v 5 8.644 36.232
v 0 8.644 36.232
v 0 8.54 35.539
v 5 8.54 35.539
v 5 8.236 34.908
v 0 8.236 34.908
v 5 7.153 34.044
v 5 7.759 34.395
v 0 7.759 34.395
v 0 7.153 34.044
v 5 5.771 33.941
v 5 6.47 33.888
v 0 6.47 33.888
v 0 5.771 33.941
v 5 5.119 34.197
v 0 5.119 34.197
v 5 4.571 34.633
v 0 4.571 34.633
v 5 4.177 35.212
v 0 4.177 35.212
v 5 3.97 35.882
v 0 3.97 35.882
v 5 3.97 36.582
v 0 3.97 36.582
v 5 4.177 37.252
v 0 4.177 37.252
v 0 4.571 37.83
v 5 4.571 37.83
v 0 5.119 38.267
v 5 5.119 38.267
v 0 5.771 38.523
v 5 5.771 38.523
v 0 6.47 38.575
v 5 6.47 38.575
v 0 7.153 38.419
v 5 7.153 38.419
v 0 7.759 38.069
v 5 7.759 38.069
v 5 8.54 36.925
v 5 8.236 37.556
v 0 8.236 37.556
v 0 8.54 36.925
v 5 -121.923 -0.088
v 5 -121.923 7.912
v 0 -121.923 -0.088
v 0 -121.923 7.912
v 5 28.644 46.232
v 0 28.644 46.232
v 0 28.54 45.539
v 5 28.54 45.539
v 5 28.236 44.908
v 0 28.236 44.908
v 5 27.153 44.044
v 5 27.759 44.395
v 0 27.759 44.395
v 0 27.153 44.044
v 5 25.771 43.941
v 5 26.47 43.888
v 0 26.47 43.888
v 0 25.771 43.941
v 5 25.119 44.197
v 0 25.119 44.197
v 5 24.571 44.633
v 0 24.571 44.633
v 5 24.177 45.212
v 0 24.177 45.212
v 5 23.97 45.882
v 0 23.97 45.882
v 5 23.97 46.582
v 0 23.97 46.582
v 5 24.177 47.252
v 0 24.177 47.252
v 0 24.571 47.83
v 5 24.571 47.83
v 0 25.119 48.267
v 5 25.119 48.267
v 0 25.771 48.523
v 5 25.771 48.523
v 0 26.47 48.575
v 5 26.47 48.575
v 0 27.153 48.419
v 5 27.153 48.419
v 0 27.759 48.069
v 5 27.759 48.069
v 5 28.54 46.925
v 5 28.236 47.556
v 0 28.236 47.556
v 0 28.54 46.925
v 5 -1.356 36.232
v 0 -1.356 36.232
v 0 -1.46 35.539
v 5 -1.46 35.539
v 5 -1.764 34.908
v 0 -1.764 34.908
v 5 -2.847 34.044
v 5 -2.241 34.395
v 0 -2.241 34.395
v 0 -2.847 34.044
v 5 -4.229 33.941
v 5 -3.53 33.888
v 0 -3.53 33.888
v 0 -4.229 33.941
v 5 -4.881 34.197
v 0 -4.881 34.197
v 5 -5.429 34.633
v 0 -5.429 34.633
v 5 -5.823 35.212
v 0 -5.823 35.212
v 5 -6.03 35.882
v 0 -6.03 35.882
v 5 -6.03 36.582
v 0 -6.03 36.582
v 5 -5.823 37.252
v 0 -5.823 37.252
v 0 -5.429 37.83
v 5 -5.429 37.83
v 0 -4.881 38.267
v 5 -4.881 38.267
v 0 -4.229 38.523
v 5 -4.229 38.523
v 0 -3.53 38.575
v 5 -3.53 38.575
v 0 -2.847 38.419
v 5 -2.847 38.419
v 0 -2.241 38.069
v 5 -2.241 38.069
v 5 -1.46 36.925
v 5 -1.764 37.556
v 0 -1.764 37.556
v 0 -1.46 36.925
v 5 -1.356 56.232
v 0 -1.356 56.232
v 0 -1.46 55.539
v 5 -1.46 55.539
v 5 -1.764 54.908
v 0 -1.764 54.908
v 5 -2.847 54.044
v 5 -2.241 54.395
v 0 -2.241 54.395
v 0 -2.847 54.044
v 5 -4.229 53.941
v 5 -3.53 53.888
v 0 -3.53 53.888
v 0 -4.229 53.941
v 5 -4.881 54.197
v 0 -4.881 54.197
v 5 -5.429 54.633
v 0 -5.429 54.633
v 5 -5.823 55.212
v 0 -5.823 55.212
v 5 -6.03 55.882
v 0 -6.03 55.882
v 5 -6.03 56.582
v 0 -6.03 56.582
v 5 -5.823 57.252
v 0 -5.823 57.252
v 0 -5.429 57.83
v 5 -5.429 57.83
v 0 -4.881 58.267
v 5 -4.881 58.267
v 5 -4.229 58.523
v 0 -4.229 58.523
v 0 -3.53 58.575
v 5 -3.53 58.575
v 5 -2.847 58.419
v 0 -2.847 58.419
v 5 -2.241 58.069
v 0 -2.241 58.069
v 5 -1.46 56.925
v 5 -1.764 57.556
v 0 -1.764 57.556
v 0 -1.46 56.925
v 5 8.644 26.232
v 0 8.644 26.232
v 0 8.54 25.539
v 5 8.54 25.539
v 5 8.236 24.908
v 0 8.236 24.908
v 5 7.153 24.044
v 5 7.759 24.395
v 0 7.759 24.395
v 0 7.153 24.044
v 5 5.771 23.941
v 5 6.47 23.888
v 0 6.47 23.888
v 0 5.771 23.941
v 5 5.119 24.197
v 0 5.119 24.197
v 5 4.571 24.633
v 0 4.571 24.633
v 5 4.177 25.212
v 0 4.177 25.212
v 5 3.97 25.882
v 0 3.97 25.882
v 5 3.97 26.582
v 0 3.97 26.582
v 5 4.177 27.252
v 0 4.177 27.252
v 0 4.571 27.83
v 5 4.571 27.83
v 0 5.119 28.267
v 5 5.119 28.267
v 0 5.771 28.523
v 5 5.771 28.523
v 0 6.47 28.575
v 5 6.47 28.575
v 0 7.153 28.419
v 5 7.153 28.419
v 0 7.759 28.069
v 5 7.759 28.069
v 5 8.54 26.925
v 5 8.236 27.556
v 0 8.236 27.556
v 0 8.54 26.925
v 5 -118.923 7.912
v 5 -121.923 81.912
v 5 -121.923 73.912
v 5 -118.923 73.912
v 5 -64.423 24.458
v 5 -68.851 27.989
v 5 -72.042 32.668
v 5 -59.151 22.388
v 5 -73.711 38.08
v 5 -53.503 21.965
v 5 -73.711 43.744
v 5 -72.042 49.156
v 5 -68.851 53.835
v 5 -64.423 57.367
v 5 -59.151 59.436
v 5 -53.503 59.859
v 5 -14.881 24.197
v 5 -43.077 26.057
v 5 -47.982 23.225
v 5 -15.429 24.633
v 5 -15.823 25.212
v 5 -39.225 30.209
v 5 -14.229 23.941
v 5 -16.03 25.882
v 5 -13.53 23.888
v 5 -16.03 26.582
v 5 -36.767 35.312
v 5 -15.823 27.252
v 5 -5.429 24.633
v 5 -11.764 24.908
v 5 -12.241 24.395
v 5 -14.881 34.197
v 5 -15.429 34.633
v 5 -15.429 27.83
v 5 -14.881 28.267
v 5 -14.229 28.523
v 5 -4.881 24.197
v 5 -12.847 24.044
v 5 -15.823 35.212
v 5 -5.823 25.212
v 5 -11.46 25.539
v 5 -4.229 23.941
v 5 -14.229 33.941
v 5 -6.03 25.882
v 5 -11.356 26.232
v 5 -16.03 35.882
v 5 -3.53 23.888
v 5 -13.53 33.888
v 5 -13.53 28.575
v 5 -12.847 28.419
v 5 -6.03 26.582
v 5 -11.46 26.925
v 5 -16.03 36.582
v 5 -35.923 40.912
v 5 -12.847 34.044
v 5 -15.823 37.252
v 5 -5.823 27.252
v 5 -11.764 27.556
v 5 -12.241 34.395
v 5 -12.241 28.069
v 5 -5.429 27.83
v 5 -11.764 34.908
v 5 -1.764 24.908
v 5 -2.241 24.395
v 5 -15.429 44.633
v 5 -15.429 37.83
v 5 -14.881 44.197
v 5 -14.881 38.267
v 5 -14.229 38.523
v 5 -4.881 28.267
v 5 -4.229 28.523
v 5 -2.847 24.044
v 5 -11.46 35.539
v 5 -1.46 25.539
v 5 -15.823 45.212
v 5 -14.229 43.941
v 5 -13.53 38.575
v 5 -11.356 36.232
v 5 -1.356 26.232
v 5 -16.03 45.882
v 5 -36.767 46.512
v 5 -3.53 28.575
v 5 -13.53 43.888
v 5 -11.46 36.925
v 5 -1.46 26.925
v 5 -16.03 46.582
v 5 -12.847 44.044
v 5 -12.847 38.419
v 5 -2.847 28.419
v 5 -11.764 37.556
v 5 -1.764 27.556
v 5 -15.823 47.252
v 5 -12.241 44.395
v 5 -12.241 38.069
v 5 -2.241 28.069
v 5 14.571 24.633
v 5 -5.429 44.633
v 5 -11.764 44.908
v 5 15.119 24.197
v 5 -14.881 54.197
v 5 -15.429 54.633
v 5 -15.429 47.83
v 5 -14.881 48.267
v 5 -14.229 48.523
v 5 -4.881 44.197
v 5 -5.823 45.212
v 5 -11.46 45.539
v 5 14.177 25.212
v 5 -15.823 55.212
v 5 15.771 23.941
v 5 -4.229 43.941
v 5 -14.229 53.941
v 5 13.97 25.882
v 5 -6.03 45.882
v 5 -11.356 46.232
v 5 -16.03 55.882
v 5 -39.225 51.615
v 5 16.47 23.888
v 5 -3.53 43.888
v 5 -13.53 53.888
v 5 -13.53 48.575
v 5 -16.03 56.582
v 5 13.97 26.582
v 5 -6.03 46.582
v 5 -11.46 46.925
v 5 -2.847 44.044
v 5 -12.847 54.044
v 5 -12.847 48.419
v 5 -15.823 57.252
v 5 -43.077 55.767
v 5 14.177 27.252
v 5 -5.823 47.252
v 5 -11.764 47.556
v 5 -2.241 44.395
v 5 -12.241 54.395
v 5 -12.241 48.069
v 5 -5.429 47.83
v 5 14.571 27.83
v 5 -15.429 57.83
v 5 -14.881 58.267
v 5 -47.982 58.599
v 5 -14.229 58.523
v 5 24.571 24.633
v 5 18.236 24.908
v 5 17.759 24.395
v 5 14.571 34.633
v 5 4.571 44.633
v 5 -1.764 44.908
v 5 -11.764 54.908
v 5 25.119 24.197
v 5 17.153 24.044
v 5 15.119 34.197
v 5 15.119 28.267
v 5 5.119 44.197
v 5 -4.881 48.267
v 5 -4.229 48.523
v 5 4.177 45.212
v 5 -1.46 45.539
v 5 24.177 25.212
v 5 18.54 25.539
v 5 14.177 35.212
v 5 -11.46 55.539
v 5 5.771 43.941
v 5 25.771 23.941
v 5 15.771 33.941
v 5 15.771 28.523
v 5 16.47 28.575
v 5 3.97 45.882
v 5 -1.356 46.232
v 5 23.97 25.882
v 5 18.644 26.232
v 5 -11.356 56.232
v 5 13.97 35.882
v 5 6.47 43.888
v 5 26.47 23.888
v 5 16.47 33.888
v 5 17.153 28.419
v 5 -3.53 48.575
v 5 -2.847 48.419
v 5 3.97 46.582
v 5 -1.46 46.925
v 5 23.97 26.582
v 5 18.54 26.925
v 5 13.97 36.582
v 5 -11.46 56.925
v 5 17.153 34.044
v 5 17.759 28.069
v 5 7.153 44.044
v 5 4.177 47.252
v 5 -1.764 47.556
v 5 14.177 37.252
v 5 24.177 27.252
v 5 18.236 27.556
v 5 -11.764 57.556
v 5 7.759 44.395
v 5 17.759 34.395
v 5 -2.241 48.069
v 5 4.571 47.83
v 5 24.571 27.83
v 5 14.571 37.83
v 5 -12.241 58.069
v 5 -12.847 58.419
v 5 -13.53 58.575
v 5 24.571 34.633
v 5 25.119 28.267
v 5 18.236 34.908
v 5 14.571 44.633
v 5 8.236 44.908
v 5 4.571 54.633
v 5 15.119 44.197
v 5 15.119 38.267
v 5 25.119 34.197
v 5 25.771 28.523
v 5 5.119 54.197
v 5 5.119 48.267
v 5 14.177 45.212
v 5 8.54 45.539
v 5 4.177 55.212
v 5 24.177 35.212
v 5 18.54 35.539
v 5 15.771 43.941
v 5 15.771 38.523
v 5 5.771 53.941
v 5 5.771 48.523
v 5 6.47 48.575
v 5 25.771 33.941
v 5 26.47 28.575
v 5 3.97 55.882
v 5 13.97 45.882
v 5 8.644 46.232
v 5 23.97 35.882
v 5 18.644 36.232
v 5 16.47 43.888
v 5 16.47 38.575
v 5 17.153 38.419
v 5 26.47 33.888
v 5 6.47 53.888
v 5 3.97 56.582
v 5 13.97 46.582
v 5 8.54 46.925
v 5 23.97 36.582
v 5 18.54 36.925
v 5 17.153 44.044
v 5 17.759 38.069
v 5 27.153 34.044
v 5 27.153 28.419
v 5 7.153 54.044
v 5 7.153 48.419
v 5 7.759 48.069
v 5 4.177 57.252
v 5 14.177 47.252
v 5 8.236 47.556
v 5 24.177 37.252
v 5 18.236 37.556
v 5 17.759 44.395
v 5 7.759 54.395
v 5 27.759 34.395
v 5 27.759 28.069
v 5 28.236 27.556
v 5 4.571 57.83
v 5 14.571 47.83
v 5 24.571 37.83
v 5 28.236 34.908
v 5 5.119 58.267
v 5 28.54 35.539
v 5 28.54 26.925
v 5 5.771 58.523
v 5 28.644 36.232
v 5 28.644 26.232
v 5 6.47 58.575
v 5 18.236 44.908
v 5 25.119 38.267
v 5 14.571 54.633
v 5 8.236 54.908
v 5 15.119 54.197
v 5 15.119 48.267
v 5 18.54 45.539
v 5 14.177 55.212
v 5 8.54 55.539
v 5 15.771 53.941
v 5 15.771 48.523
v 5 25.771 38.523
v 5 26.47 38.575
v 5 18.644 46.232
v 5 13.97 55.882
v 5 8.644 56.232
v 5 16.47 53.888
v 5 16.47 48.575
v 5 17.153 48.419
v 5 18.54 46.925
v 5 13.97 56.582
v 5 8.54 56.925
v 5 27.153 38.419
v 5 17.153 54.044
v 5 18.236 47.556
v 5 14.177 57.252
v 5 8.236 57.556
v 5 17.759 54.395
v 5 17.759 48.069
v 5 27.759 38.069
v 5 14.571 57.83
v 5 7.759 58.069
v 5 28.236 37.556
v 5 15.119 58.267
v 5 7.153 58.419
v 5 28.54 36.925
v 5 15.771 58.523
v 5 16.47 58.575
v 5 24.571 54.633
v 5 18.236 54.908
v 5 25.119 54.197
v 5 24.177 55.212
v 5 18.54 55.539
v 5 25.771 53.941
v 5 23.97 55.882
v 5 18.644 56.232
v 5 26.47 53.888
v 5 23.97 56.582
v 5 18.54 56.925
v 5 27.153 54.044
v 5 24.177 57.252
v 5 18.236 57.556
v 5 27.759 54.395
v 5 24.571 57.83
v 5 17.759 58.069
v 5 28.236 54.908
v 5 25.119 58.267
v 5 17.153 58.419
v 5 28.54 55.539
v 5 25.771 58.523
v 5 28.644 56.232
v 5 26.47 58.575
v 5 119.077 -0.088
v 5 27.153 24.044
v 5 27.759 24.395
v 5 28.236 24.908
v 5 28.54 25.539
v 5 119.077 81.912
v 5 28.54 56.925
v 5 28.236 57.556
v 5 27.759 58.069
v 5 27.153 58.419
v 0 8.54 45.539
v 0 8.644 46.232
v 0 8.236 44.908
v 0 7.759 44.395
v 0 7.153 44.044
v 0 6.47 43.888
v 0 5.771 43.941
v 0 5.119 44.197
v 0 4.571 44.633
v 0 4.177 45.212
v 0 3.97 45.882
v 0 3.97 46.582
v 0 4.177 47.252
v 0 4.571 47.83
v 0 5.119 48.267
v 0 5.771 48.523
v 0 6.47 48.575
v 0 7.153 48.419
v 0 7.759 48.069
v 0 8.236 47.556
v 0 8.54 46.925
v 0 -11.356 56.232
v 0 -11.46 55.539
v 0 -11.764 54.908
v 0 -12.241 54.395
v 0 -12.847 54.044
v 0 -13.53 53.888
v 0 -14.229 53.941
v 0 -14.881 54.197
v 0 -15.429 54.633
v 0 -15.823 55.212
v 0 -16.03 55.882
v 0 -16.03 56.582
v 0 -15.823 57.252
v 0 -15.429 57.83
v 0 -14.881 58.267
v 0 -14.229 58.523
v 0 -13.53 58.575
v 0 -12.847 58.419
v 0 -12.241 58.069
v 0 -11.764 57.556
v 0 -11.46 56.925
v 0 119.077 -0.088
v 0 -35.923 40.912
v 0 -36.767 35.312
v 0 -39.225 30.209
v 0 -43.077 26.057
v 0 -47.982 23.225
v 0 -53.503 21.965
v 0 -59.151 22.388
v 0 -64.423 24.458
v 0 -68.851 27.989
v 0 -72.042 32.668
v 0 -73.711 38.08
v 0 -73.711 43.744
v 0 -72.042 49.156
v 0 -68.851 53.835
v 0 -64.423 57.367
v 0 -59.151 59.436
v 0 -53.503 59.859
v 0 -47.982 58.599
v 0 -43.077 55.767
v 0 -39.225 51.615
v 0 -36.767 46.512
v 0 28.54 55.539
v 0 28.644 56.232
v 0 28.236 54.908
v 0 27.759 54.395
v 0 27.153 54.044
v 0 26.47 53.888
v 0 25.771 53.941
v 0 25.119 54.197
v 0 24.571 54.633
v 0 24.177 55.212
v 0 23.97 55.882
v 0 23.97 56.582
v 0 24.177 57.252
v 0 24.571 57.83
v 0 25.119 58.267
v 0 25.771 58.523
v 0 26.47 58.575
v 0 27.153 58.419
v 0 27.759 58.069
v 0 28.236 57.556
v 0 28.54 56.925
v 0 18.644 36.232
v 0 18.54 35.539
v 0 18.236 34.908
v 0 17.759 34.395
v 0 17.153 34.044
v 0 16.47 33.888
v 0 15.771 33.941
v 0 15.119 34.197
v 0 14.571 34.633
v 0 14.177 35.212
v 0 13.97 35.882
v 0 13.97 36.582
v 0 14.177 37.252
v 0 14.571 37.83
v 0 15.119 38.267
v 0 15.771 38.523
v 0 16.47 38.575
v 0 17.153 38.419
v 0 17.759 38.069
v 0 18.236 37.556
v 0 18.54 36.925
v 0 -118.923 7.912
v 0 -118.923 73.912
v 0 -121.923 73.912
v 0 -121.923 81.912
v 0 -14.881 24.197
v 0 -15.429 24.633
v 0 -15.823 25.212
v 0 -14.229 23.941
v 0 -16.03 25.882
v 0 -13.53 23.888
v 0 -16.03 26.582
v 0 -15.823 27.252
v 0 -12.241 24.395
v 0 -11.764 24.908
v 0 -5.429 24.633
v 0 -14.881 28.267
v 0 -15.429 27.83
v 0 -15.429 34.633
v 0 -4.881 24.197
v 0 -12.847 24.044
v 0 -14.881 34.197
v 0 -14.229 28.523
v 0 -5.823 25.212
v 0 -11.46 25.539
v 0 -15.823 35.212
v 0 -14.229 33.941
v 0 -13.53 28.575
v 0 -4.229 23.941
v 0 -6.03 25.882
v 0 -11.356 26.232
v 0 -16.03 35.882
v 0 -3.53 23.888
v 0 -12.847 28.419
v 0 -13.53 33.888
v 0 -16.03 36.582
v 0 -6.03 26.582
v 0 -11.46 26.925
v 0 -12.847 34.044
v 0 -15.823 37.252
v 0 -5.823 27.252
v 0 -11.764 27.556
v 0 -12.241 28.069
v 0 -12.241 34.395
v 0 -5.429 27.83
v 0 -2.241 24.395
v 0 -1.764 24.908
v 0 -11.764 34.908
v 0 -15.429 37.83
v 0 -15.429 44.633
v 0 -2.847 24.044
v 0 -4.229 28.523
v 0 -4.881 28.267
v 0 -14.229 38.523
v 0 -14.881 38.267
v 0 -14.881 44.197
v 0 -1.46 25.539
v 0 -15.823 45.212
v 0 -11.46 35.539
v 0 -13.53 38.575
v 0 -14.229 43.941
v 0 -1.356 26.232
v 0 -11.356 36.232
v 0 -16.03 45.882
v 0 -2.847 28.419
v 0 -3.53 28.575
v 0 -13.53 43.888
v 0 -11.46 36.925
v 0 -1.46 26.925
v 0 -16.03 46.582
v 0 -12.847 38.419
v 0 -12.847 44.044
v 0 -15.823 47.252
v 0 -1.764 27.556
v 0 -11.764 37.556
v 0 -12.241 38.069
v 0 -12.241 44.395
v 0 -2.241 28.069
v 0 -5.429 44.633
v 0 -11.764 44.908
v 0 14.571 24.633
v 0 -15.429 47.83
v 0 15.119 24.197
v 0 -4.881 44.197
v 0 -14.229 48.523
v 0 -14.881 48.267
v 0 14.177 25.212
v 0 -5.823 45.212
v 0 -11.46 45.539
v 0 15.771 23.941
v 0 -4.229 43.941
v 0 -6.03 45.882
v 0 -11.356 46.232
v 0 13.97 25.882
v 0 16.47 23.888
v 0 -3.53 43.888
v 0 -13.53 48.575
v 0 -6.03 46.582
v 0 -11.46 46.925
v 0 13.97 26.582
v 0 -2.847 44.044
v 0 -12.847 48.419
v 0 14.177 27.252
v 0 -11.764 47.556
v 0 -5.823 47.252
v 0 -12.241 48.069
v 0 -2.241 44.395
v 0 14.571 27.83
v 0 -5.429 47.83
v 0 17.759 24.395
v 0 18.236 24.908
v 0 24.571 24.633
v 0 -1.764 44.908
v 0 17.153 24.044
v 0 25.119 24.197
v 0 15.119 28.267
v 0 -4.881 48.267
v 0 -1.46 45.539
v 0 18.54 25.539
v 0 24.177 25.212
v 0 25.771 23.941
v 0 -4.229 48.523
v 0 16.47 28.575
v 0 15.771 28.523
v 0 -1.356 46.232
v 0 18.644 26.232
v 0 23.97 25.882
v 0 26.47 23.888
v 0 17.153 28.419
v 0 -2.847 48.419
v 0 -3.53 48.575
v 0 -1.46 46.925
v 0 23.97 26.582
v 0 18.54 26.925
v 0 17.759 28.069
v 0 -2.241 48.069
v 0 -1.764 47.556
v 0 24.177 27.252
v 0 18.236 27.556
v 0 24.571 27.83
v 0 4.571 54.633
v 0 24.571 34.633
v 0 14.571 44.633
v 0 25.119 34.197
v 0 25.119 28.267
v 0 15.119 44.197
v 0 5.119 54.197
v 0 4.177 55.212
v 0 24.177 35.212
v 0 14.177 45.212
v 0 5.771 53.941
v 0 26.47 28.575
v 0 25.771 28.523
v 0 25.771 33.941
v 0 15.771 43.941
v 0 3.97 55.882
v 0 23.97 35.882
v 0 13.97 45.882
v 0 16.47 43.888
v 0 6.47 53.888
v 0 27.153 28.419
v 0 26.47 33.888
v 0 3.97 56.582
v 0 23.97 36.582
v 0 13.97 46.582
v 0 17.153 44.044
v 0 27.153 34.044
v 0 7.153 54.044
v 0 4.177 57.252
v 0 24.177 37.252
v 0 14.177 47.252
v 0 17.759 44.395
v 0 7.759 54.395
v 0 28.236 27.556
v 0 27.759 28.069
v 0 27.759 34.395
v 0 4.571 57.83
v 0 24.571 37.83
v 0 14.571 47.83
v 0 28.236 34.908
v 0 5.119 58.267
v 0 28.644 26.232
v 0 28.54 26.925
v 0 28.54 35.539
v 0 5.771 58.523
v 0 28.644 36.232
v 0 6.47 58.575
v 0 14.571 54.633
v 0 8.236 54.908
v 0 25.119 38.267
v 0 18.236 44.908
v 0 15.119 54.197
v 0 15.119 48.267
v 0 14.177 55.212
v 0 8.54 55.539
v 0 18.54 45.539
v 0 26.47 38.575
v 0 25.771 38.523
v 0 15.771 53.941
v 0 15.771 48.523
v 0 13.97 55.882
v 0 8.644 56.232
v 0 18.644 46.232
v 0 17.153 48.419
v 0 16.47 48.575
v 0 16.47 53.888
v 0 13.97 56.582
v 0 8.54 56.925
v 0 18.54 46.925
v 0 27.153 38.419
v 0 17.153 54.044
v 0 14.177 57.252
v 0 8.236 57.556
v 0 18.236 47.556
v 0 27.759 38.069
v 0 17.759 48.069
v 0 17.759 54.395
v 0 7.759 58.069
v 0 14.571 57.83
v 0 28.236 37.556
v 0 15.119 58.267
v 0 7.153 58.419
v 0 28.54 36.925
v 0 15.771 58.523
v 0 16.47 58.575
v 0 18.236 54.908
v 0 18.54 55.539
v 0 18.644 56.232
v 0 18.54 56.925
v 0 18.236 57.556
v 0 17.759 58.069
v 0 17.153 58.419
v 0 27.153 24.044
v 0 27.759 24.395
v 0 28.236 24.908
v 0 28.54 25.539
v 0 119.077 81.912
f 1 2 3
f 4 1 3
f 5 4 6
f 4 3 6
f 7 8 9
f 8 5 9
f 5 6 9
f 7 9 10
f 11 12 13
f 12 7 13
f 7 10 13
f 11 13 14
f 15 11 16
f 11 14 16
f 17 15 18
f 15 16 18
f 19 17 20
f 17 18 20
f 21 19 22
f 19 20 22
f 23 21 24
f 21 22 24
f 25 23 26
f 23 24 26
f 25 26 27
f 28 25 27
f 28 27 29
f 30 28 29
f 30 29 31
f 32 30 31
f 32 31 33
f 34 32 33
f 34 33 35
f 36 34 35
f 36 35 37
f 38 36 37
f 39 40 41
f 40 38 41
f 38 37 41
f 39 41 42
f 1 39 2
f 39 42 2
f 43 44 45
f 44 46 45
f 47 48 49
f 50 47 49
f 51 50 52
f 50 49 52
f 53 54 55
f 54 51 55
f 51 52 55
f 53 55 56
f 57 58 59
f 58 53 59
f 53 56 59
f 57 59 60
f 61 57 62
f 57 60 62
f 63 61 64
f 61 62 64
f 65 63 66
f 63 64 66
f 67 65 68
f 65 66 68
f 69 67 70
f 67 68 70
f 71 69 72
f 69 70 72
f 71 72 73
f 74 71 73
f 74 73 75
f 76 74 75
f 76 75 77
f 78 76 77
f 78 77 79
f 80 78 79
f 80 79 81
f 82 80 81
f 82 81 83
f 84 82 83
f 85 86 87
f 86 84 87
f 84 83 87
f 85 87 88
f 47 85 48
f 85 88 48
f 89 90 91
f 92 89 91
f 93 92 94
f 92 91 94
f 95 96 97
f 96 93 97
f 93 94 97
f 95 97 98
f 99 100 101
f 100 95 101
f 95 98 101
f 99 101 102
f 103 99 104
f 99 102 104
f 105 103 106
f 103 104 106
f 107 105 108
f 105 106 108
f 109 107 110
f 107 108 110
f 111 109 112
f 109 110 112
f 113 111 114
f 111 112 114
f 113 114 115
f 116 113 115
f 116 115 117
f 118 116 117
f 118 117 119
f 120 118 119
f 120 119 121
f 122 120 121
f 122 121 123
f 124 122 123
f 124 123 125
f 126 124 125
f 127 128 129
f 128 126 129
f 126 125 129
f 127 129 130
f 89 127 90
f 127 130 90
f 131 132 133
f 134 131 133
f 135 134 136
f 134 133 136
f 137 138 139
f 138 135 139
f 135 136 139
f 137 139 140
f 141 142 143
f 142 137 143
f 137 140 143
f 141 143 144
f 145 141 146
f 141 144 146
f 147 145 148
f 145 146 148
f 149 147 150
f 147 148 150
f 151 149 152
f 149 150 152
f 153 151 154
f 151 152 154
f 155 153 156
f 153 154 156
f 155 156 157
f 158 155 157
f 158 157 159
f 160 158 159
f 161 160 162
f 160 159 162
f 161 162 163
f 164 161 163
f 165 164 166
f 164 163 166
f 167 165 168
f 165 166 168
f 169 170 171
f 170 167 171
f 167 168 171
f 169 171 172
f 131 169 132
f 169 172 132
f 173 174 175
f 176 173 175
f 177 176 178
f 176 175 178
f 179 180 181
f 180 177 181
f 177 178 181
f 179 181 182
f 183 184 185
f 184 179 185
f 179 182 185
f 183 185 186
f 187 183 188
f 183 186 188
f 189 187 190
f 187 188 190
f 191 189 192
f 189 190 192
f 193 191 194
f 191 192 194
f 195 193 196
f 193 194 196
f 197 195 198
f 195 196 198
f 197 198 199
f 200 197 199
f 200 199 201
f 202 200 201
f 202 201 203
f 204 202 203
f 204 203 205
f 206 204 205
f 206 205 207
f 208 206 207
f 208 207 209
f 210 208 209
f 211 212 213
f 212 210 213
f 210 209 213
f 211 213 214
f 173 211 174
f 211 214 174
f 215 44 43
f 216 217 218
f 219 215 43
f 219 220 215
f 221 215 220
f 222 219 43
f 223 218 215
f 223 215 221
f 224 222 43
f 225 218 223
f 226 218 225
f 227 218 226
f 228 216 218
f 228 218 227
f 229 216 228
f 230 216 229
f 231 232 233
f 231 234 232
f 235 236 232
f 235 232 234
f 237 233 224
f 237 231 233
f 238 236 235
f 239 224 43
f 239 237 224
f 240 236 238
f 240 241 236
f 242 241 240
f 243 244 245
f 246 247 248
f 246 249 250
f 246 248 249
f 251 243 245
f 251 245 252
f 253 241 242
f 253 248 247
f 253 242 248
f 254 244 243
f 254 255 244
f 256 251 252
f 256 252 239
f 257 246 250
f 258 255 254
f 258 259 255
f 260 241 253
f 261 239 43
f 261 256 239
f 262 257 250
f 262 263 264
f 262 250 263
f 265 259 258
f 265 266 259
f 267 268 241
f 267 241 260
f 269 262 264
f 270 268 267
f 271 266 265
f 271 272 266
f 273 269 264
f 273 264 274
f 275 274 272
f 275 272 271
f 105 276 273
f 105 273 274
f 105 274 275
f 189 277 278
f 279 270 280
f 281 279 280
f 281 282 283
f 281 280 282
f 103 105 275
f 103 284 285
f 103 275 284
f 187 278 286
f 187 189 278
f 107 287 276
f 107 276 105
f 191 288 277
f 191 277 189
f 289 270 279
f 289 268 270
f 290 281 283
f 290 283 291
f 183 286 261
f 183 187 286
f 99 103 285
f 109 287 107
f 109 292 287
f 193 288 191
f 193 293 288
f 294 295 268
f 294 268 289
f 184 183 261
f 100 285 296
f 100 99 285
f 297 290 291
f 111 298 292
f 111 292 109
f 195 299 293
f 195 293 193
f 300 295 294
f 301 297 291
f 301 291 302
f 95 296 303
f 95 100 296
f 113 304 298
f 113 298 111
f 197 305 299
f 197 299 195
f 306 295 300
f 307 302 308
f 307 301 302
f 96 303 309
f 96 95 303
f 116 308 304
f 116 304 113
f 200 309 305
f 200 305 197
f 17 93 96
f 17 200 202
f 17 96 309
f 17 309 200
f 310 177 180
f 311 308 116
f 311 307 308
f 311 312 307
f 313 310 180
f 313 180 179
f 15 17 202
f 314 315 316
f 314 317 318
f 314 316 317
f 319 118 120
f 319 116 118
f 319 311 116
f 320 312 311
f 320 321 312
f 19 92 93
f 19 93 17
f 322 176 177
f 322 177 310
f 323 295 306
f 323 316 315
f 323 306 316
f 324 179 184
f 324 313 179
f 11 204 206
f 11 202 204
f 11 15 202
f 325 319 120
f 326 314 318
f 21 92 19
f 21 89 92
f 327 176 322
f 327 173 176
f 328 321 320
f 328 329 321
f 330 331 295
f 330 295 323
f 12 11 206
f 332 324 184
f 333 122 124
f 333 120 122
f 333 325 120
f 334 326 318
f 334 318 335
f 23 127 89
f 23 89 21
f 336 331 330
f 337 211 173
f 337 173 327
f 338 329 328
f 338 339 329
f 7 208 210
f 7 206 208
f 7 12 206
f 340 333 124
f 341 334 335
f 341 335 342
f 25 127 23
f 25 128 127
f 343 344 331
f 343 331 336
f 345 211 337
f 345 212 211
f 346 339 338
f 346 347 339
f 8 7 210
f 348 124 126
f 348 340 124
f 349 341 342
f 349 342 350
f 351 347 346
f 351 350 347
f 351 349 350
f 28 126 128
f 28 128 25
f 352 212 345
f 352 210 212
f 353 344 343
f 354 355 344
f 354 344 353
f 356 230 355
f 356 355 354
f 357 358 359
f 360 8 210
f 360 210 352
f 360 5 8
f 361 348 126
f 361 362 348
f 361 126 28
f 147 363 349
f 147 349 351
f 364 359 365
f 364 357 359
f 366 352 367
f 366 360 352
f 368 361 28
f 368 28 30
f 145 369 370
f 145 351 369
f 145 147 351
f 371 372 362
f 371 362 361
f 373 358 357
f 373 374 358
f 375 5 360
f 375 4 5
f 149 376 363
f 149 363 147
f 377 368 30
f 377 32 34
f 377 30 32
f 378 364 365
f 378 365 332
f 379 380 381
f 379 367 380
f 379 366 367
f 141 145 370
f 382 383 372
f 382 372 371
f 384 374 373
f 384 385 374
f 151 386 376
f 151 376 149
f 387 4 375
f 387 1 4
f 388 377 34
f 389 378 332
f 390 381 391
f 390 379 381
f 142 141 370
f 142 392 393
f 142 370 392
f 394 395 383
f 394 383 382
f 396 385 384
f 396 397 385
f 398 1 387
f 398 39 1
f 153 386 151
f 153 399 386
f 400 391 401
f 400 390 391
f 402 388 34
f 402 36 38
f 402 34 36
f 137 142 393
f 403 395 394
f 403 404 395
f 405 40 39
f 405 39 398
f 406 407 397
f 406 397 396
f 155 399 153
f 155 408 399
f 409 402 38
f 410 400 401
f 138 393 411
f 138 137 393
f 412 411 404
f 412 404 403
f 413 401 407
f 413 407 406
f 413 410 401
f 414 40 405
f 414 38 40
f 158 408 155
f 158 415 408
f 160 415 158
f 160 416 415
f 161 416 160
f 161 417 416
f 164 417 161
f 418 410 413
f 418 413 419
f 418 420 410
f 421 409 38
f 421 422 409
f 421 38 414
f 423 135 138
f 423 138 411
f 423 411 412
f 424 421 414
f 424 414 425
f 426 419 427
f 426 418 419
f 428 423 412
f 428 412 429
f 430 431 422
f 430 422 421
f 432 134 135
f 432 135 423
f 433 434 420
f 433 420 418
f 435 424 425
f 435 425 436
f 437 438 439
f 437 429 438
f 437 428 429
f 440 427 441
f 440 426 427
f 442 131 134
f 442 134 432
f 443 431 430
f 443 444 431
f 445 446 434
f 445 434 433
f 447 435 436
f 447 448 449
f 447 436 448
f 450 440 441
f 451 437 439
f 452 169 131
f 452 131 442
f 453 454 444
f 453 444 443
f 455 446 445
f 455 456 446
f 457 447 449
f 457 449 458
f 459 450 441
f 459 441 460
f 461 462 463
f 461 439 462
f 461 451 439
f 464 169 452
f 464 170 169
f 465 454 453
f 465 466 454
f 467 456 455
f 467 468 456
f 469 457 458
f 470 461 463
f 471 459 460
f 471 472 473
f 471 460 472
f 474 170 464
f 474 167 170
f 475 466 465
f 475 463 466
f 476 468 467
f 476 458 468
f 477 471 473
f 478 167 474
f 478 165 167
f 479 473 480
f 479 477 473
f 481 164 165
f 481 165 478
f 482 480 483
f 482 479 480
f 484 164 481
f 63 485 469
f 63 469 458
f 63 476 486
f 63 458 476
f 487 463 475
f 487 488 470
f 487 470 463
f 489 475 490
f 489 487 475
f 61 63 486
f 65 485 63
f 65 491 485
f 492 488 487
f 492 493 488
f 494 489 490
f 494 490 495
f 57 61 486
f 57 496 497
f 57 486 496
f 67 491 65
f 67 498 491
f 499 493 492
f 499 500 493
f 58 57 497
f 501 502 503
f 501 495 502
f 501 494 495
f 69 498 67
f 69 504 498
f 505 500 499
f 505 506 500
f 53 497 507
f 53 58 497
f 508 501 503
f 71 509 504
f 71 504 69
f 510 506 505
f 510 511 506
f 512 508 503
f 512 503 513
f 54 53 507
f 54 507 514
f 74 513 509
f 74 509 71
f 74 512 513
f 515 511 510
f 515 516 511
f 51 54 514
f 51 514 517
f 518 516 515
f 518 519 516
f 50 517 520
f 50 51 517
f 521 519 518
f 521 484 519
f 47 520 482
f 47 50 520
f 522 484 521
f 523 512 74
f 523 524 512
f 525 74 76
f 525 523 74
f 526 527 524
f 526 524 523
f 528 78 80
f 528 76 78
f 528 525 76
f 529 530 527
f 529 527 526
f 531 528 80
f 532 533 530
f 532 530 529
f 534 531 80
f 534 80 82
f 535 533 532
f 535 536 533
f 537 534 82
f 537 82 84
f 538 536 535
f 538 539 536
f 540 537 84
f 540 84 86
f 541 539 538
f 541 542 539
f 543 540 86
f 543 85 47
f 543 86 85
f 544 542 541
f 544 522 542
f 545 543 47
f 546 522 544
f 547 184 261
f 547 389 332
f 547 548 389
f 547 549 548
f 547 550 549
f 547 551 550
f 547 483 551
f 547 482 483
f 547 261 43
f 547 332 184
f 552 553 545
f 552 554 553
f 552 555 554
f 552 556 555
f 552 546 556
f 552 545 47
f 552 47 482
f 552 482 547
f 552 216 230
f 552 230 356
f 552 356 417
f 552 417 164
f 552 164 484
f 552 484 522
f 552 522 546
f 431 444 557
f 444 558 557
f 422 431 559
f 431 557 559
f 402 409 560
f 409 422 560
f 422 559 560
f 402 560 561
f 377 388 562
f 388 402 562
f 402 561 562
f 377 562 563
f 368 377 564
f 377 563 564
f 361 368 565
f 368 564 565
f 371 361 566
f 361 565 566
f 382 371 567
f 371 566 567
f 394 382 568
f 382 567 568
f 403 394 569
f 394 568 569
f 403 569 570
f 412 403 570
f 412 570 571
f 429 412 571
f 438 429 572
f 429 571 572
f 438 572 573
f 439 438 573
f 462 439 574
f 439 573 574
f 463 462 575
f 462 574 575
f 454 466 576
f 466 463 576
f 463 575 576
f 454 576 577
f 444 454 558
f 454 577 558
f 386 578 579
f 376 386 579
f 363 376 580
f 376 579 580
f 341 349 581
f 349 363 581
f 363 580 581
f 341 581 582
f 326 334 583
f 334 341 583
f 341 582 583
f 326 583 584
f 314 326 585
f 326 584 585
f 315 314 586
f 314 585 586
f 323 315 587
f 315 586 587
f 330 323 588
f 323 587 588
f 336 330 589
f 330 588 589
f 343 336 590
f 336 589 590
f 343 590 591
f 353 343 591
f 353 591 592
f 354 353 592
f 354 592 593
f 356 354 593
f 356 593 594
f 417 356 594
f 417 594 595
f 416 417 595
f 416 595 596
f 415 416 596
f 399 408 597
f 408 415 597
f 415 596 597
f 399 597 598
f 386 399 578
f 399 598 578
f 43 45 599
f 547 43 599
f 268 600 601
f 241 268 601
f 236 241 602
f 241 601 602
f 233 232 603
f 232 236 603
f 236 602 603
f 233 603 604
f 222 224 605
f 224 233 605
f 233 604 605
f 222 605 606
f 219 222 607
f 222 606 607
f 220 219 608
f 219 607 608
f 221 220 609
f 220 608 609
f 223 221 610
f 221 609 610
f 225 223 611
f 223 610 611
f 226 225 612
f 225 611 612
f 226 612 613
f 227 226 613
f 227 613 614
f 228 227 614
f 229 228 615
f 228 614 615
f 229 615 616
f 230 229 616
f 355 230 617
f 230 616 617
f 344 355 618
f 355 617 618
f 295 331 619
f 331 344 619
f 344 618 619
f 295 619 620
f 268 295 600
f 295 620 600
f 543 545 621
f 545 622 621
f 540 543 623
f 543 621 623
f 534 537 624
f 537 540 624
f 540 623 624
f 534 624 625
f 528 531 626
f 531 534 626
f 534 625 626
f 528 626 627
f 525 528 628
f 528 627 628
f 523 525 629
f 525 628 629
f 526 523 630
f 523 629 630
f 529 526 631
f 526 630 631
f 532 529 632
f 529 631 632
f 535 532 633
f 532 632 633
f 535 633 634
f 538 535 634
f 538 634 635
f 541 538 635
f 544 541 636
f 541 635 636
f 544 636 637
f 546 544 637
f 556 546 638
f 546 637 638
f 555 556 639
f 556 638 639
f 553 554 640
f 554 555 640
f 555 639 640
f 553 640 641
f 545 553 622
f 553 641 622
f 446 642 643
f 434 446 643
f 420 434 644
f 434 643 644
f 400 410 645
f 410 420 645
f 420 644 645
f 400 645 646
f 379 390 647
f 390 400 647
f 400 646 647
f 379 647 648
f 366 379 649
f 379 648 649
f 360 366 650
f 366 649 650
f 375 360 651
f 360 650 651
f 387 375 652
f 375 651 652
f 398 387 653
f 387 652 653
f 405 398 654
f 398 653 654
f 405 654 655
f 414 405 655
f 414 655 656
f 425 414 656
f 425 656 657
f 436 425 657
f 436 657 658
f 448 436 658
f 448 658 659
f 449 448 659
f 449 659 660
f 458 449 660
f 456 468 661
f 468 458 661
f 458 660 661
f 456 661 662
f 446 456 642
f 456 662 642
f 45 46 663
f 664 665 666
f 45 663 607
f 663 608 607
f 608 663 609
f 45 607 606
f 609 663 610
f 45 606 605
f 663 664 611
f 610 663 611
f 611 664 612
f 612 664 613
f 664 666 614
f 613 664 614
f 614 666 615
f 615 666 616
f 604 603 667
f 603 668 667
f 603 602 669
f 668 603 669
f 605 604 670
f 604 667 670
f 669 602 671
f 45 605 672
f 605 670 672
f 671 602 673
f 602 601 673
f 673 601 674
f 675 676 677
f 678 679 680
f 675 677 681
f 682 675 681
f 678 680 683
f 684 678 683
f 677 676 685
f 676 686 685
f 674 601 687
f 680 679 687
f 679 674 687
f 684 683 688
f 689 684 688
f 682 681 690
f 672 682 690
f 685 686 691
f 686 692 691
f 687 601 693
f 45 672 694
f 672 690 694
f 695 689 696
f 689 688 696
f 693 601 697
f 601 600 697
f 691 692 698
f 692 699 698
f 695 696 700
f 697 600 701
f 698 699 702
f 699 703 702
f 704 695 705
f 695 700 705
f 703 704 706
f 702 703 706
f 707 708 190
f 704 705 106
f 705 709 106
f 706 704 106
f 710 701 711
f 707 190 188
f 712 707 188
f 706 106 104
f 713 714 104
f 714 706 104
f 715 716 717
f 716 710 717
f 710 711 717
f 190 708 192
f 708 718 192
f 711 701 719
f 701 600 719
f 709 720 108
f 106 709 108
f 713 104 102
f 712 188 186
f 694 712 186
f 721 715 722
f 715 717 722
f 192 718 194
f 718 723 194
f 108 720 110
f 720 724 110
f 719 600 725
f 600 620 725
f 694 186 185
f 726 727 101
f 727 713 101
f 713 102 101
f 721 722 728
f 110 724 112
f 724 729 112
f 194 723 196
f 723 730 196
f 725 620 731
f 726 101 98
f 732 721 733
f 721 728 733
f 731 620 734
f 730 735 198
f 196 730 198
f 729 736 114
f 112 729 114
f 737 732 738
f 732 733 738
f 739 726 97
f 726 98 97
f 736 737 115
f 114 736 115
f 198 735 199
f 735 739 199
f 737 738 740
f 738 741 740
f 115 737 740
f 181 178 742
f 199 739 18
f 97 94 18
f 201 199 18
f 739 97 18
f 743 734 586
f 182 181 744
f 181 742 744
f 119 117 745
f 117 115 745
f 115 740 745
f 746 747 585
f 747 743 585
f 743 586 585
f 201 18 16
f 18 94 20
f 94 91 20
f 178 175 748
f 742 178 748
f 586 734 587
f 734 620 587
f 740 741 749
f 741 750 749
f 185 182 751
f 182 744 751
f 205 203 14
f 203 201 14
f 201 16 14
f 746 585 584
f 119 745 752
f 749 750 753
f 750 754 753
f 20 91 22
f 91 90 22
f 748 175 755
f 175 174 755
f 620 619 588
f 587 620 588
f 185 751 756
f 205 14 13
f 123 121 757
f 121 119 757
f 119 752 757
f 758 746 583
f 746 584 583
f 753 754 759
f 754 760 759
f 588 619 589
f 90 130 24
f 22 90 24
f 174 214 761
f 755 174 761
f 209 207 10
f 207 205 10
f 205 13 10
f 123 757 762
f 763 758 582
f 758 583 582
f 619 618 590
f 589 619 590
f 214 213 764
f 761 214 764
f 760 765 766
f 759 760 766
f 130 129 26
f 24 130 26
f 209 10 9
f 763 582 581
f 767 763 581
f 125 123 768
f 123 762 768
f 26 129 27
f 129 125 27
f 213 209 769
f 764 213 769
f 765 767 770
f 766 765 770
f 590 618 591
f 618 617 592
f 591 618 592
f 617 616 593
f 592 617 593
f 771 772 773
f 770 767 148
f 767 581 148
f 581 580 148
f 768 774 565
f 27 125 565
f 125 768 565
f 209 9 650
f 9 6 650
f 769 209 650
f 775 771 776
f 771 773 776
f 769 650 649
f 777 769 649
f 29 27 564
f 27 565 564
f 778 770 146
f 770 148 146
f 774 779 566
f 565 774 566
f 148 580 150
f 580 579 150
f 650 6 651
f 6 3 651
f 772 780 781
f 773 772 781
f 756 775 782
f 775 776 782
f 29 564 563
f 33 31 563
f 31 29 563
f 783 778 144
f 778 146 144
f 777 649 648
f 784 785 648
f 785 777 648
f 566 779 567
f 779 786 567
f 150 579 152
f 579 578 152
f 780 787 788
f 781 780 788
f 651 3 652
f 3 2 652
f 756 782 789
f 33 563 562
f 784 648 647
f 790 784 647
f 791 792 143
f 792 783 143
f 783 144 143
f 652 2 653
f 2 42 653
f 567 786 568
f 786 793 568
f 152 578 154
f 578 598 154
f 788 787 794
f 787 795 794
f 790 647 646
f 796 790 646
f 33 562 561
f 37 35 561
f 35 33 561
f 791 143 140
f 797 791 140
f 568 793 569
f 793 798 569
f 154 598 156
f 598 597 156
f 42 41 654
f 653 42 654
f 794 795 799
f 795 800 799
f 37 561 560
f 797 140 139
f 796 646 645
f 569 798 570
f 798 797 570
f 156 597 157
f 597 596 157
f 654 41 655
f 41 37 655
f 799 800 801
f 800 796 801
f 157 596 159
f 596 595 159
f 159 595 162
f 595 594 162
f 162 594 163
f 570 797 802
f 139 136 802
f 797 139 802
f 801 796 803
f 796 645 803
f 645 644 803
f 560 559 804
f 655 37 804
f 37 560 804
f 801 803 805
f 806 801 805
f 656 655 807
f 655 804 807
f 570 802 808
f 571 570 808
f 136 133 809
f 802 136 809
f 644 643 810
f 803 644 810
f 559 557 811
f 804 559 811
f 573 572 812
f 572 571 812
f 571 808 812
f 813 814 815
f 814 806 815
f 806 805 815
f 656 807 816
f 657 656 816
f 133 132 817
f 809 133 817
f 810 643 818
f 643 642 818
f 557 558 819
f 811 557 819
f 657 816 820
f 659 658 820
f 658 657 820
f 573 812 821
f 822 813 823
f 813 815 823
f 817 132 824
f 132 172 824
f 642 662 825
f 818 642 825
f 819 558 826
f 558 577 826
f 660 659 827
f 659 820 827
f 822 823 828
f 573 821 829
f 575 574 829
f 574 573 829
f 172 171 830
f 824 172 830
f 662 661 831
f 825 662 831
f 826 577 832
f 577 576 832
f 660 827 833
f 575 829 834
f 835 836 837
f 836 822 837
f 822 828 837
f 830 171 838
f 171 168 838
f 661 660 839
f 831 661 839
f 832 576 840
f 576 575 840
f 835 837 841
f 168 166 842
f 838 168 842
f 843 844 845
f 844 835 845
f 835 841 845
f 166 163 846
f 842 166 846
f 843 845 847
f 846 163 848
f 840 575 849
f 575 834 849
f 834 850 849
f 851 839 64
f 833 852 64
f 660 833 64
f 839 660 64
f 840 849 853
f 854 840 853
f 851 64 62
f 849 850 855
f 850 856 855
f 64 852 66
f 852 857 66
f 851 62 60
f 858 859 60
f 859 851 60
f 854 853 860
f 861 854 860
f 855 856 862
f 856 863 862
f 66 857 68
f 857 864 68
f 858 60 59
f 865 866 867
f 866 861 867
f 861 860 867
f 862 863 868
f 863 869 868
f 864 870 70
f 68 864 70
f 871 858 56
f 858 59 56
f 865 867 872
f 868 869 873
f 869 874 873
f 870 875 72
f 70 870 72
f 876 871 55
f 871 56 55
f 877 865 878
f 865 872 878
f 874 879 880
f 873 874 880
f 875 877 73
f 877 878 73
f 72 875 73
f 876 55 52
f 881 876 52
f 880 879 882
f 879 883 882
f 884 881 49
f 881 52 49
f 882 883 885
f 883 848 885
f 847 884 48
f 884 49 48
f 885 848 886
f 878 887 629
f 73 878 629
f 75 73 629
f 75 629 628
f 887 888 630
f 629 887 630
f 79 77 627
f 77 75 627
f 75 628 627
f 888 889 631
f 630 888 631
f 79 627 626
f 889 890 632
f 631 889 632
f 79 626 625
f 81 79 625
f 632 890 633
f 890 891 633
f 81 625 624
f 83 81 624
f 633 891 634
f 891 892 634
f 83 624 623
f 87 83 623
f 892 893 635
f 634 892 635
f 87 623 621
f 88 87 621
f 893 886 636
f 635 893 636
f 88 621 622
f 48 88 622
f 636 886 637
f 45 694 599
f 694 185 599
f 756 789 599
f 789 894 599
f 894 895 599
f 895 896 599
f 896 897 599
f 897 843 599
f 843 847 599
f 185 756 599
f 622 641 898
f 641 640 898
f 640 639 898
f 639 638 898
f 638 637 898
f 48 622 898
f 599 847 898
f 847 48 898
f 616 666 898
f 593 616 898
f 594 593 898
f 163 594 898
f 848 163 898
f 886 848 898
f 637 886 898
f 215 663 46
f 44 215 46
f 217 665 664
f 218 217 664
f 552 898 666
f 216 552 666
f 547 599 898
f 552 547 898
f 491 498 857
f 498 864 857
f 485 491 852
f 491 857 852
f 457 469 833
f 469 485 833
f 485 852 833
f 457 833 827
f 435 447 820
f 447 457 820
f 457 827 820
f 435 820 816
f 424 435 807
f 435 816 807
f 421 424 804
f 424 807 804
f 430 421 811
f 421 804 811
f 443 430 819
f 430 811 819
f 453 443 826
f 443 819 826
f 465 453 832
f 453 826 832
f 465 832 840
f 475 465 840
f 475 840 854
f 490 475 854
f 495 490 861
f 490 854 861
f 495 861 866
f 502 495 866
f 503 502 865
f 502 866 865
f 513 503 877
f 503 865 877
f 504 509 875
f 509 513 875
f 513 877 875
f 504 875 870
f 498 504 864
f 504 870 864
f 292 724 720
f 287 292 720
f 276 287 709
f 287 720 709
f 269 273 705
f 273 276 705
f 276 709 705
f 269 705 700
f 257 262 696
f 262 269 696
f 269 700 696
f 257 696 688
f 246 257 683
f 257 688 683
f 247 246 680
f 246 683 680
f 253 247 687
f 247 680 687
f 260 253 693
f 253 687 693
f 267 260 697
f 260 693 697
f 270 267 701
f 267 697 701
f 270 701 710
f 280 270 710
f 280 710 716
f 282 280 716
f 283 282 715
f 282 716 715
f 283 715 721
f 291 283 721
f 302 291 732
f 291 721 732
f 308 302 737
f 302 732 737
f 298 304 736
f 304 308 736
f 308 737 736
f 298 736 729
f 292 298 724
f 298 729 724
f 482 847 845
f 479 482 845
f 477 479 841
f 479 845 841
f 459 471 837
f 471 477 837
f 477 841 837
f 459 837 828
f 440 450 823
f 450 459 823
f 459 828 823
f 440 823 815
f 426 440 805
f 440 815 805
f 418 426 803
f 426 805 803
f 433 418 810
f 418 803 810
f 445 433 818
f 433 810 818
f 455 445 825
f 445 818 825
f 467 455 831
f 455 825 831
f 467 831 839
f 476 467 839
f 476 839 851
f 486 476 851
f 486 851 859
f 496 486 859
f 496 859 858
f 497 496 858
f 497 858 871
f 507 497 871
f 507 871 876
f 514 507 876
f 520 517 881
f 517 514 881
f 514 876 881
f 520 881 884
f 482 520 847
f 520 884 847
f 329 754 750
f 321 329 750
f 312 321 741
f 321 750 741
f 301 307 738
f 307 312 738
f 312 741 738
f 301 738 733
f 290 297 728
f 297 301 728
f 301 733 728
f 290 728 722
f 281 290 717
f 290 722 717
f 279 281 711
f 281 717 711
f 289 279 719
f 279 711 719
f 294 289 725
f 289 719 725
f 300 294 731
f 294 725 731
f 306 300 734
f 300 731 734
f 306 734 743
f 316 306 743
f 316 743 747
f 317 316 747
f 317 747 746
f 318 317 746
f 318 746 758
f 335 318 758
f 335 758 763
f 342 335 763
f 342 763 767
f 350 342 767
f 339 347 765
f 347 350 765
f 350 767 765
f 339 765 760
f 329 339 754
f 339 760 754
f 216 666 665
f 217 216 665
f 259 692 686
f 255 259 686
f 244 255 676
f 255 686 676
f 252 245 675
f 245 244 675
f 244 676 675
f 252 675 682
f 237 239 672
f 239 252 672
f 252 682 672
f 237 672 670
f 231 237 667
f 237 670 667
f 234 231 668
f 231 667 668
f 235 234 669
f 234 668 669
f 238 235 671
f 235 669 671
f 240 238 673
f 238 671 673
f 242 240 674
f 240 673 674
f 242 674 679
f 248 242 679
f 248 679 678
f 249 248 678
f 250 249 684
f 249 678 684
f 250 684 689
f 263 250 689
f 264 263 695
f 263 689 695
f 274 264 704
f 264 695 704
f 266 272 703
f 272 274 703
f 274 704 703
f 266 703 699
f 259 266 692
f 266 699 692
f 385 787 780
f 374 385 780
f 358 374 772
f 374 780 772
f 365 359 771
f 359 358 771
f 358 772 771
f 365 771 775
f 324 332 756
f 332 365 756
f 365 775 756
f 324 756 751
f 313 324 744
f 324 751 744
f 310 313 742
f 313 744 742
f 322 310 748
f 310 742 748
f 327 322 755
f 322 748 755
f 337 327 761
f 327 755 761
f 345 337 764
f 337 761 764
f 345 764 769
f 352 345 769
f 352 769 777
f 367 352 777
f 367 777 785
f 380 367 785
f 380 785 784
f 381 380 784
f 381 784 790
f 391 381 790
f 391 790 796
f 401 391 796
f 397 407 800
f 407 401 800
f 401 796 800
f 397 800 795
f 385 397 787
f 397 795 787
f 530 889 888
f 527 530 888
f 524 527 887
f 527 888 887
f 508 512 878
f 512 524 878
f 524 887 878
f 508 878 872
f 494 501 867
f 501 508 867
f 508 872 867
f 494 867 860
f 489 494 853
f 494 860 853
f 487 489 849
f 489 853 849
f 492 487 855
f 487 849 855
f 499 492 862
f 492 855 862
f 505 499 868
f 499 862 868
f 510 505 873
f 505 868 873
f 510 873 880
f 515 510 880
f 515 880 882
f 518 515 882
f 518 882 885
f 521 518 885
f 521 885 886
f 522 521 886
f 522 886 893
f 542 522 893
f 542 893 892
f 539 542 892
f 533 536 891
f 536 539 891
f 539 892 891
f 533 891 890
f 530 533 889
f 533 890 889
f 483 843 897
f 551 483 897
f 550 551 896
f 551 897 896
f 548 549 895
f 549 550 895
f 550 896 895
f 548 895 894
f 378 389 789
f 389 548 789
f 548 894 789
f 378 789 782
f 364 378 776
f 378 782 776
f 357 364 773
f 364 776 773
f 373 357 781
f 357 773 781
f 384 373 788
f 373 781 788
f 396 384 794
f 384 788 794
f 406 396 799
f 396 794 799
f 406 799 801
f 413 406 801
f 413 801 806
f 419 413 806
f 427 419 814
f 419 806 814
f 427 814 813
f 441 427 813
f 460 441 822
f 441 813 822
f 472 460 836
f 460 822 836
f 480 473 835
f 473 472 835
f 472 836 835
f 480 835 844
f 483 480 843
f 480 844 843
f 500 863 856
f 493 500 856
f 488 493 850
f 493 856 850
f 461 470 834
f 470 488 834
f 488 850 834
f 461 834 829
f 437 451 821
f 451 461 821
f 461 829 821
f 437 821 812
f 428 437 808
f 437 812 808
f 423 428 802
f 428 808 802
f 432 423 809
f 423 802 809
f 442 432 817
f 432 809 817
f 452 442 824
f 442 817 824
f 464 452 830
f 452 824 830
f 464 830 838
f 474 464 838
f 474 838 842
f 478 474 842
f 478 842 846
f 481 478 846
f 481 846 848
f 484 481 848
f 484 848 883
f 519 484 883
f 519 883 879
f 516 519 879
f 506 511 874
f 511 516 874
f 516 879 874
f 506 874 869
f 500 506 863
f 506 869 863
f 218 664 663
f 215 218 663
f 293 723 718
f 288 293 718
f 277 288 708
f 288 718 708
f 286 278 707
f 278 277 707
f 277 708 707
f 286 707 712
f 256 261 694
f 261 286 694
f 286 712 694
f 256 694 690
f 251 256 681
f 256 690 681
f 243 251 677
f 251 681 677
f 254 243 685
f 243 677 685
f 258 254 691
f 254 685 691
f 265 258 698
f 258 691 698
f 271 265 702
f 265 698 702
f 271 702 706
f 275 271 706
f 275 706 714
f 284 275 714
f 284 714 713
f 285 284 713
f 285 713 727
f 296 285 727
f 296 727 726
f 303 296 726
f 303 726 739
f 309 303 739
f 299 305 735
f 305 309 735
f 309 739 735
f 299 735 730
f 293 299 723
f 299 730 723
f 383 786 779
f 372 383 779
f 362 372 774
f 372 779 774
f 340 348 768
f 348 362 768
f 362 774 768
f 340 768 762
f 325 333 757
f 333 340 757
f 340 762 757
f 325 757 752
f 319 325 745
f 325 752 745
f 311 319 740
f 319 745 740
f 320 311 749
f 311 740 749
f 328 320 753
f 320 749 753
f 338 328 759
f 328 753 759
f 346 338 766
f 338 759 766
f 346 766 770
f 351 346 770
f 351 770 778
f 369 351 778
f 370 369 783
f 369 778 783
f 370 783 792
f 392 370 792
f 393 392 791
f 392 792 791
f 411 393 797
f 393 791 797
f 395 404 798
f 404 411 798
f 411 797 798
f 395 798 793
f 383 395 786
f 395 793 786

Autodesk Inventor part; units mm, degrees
ref_plane "YZ Plane" through (0, 0, 0) normal (1, 0, 0) x (0, 1, 0)
ref_plane "XZ Plane" through (0, 0, 0) normal (0, 1, 0) x (-1, 0, 0)
ref_plane "XY Plane" through (0, 0, 0) normal (0, 0, 1) x (1, 0, 0)
sketch "Sketch1" plane through (0, 0, 0) normal (1, 0, 0) x (0, 1, 0)
  line L0 (119.0767, 81.9121) -> (-121.9233, 81.9121)
  line L1 (-121.9233, 81.9121) -> (-121.9233, -0.0879)
  line L2 (-121.9233, -0.0879) -> (119.0767, -0.0879)
  line L3 (119.0767, -0.0879) -> (119.0767, 81.9121)
  circle A0 centre (-54.9233, 40.9121) radius 19
  line L4 (-121.9233, 73.9121) -> (-118.9233, 73.9121)
  line L5 (-118.9233, 73.9121) -> (-118.9233, 7.9121)
  line L6 (-118.9233, 7.9121) -> (-121.9233, 7.9121)
  line L7 (-121.9233, 7.9121) -> (-121.9233, 73.9121)
  circle A1 centre (26.2941, 56.2319) radius 2.35
  circle A2 centre (16.2941, 56.2319) radius 2.35
  circle A3 centre (6.2941, 56.2319) radius 2.35
  circle A4 centre (-3.7059, 56.2319) radius 2.35
  circle A5 centre (-13.7059, 56.2319) radius 2.35
  circle A6 centre (26.2941, 46.2319) radius 2.35
  circle A7 centre (16.2941, 46.2319) radius 2.35
  circle A8 centre (6.2941, 46.2319) radius 2.35
  circle A9 centre (-3.7059, 46.2319) radius 2.35
  circle A10 centre (-13.7059, 46.2319) radius 2.35
  circle A11 centre (26.2941, 36.2319) radius 2.35
  circle A12 centre (16.2941, 36.2319) radius 2.35
  circle A13 centre (6.2941, 36.2319) radius 2.35
  circle A14 centre (-3.7059, 36.2319) radius 2.35
  circle A15 centre (-13.7059, 36.2319) radius 2.35
  circle A16 centre (26.2941, 26.2319) radius 2.35
  circle A17 centre (16.2941, 26.2319) radius 2.35
  circle A18 centre (6.2941, 26.2319) radius 2.35
  circle A19 centre (-3.7059, 26.2319) radius 2.35
  circle A20 centre (-13.7059, 26.2319) radius 2.35
  point P0 (0, 0)
  point P1 (0, 0)
  dimension "d0" = 241
  dimension "d1" = 82
  dimension "d2" = 38
  dimension "d3" = 41
  dimension "d4" = 174
  dimension "d5" = 66
  dimension "d6" = 3
  dimension "d7" = 8
  dimension "d21" = 4.7
  dimension "d24" = 10
  dimension "d27" = 10
extrude "Extrusion1" add sketch "Sketch1" along normal blind 5 contours L3 L2 L1 L6 L5 L4 L0
equation "\"d3\" = 0.5 * d1"
equation "\"d7\" = -0.5 * d5 + 0.5 * d1"
properties part number "inner_3Poke"
